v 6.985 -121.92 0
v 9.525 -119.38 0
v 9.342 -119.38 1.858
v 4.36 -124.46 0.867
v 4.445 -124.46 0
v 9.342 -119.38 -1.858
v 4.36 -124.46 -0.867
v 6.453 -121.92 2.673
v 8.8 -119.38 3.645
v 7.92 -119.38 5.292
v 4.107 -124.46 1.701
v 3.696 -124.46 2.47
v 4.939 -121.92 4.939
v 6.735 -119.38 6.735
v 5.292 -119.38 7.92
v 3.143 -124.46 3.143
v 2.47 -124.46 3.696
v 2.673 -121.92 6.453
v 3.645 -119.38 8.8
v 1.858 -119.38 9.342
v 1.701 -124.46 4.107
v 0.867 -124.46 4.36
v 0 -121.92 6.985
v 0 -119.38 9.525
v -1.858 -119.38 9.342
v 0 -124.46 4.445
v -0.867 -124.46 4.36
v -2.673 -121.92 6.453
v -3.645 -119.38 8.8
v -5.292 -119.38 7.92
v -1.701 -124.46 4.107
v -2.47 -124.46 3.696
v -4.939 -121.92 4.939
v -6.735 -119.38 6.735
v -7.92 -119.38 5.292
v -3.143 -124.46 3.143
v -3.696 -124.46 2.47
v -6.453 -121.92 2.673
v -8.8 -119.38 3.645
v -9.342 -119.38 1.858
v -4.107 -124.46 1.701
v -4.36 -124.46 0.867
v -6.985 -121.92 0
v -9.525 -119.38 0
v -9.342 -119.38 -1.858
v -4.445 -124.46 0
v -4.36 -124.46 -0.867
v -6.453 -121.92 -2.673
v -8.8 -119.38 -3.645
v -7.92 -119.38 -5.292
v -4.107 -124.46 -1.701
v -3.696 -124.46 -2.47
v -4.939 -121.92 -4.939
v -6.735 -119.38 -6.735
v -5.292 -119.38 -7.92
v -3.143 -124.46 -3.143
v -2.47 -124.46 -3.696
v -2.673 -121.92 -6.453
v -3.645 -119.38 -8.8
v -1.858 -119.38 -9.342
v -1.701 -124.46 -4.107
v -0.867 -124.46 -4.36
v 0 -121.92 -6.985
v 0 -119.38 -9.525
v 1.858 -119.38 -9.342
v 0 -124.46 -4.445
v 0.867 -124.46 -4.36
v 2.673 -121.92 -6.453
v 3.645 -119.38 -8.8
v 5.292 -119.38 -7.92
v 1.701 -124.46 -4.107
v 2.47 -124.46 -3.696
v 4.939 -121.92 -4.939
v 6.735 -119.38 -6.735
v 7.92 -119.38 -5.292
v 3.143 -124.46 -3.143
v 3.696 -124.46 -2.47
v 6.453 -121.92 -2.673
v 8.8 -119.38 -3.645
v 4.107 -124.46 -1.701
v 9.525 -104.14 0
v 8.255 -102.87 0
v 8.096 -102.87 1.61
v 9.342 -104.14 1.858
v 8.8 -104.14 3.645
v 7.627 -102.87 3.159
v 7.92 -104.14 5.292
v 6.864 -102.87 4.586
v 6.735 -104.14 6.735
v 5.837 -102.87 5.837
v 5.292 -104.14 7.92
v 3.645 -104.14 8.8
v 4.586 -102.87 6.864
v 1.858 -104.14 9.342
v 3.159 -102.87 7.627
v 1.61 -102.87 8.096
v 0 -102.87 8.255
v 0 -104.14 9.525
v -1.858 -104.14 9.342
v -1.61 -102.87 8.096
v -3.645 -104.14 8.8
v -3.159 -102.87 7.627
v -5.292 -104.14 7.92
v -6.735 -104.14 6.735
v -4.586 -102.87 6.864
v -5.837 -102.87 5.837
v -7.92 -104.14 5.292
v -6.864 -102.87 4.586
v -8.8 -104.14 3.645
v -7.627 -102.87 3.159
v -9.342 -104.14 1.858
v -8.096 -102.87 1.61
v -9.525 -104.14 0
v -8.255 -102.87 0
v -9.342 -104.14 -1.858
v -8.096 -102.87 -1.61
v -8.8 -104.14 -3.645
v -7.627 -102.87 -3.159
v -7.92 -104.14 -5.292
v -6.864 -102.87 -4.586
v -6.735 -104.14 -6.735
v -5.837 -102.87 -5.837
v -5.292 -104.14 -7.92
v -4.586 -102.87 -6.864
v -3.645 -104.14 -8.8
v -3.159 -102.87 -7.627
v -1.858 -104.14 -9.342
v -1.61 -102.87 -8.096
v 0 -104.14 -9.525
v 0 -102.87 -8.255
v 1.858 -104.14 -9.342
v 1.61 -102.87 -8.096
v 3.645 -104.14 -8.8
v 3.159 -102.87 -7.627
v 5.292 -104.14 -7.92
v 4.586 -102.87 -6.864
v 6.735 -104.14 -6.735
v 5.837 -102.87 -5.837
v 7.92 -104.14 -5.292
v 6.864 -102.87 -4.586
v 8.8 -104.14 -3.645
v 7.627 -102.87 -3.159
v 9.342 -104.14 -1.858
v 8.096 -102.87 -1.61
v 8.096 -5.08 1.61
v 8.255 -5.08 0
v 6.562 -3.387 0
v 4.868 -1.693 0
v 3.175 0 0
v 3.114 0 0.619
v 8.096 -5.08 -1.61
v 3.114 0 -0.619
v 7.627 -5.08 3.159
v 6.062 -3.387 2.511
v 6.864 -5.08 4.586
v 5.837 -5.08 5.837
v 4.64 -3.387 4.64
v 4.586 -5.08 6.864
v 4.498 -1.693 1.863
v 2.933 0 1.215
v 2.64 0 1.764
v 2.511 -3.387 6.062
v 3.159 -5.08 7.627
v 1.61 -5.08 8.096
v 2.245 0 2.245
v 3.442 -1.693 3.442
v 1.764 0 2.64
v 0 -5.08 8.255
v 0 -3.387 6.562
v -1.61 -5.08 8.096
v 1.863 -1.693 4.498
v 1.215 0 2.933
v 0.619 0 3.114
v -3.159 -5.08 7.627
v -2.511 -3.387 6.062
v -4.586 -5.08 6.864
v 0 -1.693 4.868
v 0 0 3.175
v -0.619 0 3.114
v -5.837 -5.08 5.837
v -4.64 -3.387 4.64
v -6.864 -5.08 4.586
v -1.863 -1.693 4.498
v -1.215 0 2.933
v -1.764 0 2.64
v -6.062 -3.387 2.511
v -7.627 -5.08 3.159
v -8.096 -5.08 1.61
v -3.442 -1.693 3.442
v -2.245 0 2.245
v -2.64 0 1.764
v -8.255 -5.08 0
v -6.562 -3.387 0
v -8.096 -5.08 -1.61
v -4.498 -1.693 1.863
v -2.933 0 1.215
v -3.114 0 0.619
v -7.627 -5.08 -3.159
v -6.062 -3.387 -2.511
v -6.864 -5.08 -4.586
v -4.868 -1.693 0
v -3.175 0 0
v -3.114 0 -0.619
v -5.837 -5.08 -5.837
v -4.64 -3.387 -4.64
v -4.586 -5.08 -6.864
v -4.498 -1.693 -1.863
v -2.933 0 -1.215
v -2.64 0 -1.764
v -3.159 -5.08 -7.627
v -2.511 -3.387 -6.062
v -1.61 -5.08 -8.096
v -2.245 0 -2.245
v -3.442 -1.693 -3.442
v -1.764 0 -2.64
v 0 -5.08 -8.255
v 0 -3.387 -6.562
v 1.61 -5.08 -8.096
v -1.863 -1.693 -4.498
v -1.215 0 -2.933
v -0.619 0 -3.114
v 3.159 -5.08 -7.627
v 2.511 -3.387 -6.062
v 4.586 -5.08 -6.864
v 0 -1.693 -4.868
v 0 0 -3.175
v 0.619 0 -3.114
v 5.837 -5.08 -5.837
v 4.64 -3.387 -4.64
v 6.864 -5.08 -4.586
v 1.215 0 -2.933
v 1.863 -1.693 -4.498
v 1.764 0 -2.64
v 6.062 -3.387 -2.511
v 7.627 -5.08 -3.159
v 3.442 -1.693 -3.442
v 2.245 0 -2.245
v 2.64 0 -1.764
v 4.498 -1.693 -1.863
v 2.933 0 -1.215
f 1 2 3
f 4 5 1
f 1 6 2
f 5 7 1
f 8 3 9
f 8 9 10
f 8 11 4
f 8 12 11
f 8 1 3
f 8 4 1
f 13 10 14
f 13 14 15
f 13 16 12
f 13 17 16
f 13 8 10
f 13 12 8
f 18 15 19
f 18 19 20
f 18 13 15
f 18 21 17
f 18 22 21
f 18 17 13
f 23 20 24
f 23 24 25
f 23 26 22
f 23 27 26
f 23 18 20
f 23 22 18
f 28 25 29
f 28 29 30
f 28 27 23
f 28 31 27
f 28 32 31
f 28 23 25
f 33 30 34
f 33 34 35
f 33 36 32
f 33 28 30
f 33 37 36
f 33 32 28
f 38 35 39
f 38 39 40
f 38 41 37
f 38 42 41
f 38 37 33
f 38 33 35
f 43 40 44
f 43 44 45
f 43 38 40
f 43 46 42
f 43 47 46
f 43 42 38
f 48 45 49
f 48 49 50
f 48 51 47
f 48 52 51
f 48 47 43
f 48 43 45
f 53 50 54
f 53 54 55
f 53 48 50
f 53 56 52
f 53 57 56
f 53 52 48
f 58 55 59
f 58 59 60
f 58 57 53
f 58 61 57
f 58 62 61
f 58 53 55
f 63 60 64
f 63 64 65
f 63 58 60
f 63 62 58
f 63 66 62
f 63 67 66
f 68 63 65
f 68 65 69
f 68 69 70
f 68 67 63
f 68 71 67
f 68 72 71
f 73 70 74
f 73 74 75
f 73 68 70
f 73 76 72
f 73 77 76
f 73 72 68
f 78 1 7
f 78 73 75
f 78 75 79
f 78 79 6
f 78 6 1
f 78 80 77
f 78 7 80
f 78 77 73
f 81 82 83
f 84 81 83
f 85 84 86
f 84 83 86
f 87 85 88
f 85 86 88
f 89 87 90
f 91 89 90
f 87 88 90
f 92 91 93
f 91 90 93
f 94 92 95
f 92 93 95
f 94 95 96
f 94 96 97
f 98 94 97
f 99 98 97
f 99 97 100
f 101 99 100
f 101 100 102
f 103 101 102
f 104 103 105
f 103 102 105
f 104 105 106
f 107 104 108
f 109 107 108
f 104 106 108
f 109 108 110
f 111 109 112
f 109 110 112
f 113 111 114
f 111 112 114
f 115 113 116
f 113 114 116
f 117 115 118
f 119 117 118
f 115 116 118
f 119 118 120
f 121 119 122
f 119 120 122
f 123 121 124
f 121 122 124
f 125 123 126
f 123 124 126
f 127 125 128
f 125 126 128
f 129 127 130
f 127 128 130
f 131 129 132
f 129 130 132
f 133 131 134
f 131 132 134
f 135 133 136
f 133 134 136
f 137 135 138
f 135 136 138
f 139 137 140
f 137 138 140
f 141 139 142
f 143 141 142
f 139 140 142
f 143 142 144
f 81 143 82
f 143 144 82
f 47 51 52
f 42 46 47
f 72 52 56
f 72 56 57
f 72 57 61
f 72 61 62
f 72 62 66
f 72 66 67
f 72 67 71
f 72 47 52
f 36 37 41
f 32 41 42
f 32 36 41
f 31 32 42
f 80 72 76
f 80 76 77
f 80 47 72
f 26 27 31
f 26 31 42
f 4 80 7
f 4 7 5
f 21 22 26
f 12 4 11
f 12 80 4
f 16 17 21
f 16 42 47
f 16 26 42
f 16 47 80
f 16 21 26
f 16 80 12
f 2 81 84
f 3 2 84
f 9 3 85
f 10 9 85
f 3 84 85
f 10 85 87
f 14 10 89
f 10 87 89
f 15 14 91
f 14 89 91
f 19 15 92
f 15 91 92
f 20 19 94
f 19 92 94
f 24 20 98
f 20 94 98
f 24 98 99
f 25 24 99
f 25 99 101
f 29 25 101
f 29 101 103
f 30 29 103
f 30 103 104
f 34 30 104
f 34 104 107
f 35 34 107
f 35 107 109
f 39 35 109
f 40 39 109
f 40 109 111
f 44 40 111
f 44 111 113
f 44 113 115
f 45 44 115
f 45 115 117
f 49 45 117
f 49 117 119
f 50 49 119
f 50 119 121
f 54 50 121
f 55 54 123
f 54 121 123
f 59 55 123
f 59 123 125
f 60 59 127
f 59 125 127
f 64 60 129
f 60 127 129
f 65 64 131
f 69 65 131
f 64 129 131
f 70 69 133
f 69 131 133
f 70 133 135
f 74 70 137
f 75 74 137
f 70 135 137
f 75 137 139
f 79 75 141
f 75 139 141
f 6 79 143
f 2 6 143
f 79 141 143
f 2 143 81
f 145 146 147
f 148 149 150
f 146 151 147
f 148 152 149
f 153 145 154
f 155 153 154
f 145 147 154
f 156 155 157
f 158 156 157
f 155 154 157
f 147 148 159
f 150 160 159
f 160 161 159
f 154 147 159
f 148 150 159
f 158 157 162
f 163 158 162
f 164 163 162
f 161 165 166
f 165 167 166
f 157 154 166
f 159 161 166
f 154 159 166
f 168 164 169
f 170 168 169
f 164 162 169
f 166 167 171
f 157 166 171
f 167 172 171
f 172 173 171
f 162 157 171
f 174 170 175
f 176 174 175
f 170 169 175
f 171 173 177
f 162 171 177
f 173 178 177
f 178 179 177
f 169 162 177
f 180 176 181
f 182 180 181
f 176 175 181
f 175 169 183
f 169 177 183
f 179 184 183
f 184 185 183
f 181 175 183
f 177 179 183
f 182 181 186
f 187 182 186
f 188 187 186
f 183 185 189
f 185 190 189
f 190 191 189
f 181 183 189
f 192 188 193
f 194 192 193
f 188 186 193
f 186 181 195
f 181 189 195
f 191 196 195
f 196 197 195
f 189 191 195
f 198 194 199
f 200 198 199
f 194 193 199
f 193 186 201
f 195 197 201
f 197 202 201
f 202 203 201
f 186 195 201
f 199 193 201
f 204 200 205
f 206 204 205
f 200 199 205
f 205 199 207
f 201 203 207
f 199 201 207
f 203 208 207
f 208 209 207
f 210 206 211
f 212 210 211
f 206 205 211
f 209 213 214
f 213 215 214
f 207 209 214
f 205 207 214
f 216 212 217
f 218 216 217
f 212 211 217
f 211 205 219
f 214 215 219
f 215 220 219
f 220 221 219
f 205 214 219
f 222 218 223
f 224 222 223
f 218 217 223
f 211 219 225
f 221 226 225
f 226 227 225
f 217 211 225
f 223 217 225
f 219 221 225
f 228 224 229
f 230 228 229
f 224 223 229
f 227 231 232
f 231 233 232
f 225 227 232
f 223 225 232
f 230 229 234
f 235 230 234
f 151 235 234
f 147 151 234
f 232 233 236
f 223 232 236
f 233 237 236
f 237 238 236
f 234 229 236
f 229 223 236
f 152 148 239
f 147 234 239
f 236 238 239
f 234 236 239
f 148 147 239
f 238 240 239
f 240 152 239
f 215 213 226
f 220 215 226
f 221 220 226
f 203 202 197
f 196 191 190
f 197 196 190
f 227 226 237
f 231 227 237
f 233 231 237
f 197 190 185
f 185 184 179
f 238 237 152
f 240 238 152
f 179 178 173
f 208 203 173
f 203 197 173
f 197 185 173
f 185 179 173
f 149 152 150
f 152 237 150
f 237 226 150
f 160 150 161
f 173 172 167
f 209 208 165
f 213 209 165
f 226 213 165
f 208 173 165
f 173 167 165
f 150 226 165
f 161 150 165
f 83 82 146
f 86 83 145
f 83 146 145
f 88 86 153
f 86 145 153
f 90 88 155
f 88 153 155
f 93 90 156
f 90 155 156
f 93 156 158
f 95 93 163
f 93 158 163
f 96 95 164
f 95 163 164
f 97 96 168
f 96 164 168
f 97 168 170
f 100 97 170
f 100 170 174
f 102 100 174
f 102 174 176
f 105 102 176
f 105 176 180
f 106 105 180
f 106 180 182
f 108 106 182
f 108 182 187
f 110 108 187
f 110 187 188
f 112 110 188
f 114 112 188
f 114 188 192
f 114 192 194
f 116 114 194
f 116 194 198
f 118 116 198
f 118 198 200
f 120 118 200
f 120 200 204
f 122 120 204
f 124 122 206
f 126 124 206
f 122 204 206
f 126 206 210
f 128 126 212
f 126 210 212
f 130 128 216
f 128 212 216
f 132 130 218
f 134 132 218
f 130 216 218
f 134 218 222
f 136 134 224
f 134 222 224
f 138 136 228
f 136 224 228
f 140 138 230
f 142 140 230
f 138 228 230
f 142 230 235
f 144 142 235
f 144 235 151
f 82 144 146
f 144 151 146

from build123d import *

# Parameters (mm, degrees)
F0_R        = 8.255
F1_DEPTH    = 99.06
F2_R        = 9.525
F3_DEPTH    = 25.4
F4_S5_R     = 8.255
F4_T6_DEPTH = 15
F5_SIZE     = 5.08


# Not quite as in the source:
# - a fillet or chamfer that OpenCascade refuses, or shapes differently, is made with other operations: its cross-section is extruded or revolved along the edge and cut away or added


with BuildPart() as f1:
    # F0 (on Front) → F1 (new body)
    with BuildSketch(Plane.XZ):
        Circle(F0_R)
    extrude(amount=F1_DEPTH)

    # F2 (on face) → F3 (join)
    with BuildSketch(Plane.XZ.offset(99.06)):
        Circle(F2_R)
    extrude(amount=F3_DEPTH)

    # F4: chamfer of 5.08 on 3 edges, made by hand


with BuildPart() as f4_tool2:
    # F4_s3 → F4_t4 (revolve)
    with BuildSketch(Plane.XY):
        Polygon((9.525, -104.14), (4.445, -99.06), (9.525, -99.06), align=None)
    revolve(axis=Axis((0, -99.06, 0), (0, -1, 0)))

    # F4_s5 → F4_t6 (cut, symmetric)
    with BuildSketch(Plane.XZ.offset(101.6)):
        Circle(F4_S5_R)
    extrude(amount=F4_T6_DEPTH, both=True, mode=Mode.SUBTRACT)


with BuildPart() as f1_1:
    add(f1.part)

    # F4_t1: cut F4_tool2
    add(f4_tool2.part, mode=Mode.SUBTRACT)

    # F4_s7 → F4_t8 (revolve, cut)
    with BuildSketch(Plane.XY):
        Polygon((9.525, -119.38), (4.445, -124.46), (9.525, -124.46), align=None)
    revolve(axis=Axis((0, -124.46, 0), (0, -1, 0)), mode=Mode.SUBTRACT)

    # F5
    f5_edges = [f1_1.edges().sort_by_distance(p)[0] for p in [
        (-8.255, 0, 0),
    ]]
    chamfer(f5_edges, length=F5_SIZE)


solid = f1_1.part
